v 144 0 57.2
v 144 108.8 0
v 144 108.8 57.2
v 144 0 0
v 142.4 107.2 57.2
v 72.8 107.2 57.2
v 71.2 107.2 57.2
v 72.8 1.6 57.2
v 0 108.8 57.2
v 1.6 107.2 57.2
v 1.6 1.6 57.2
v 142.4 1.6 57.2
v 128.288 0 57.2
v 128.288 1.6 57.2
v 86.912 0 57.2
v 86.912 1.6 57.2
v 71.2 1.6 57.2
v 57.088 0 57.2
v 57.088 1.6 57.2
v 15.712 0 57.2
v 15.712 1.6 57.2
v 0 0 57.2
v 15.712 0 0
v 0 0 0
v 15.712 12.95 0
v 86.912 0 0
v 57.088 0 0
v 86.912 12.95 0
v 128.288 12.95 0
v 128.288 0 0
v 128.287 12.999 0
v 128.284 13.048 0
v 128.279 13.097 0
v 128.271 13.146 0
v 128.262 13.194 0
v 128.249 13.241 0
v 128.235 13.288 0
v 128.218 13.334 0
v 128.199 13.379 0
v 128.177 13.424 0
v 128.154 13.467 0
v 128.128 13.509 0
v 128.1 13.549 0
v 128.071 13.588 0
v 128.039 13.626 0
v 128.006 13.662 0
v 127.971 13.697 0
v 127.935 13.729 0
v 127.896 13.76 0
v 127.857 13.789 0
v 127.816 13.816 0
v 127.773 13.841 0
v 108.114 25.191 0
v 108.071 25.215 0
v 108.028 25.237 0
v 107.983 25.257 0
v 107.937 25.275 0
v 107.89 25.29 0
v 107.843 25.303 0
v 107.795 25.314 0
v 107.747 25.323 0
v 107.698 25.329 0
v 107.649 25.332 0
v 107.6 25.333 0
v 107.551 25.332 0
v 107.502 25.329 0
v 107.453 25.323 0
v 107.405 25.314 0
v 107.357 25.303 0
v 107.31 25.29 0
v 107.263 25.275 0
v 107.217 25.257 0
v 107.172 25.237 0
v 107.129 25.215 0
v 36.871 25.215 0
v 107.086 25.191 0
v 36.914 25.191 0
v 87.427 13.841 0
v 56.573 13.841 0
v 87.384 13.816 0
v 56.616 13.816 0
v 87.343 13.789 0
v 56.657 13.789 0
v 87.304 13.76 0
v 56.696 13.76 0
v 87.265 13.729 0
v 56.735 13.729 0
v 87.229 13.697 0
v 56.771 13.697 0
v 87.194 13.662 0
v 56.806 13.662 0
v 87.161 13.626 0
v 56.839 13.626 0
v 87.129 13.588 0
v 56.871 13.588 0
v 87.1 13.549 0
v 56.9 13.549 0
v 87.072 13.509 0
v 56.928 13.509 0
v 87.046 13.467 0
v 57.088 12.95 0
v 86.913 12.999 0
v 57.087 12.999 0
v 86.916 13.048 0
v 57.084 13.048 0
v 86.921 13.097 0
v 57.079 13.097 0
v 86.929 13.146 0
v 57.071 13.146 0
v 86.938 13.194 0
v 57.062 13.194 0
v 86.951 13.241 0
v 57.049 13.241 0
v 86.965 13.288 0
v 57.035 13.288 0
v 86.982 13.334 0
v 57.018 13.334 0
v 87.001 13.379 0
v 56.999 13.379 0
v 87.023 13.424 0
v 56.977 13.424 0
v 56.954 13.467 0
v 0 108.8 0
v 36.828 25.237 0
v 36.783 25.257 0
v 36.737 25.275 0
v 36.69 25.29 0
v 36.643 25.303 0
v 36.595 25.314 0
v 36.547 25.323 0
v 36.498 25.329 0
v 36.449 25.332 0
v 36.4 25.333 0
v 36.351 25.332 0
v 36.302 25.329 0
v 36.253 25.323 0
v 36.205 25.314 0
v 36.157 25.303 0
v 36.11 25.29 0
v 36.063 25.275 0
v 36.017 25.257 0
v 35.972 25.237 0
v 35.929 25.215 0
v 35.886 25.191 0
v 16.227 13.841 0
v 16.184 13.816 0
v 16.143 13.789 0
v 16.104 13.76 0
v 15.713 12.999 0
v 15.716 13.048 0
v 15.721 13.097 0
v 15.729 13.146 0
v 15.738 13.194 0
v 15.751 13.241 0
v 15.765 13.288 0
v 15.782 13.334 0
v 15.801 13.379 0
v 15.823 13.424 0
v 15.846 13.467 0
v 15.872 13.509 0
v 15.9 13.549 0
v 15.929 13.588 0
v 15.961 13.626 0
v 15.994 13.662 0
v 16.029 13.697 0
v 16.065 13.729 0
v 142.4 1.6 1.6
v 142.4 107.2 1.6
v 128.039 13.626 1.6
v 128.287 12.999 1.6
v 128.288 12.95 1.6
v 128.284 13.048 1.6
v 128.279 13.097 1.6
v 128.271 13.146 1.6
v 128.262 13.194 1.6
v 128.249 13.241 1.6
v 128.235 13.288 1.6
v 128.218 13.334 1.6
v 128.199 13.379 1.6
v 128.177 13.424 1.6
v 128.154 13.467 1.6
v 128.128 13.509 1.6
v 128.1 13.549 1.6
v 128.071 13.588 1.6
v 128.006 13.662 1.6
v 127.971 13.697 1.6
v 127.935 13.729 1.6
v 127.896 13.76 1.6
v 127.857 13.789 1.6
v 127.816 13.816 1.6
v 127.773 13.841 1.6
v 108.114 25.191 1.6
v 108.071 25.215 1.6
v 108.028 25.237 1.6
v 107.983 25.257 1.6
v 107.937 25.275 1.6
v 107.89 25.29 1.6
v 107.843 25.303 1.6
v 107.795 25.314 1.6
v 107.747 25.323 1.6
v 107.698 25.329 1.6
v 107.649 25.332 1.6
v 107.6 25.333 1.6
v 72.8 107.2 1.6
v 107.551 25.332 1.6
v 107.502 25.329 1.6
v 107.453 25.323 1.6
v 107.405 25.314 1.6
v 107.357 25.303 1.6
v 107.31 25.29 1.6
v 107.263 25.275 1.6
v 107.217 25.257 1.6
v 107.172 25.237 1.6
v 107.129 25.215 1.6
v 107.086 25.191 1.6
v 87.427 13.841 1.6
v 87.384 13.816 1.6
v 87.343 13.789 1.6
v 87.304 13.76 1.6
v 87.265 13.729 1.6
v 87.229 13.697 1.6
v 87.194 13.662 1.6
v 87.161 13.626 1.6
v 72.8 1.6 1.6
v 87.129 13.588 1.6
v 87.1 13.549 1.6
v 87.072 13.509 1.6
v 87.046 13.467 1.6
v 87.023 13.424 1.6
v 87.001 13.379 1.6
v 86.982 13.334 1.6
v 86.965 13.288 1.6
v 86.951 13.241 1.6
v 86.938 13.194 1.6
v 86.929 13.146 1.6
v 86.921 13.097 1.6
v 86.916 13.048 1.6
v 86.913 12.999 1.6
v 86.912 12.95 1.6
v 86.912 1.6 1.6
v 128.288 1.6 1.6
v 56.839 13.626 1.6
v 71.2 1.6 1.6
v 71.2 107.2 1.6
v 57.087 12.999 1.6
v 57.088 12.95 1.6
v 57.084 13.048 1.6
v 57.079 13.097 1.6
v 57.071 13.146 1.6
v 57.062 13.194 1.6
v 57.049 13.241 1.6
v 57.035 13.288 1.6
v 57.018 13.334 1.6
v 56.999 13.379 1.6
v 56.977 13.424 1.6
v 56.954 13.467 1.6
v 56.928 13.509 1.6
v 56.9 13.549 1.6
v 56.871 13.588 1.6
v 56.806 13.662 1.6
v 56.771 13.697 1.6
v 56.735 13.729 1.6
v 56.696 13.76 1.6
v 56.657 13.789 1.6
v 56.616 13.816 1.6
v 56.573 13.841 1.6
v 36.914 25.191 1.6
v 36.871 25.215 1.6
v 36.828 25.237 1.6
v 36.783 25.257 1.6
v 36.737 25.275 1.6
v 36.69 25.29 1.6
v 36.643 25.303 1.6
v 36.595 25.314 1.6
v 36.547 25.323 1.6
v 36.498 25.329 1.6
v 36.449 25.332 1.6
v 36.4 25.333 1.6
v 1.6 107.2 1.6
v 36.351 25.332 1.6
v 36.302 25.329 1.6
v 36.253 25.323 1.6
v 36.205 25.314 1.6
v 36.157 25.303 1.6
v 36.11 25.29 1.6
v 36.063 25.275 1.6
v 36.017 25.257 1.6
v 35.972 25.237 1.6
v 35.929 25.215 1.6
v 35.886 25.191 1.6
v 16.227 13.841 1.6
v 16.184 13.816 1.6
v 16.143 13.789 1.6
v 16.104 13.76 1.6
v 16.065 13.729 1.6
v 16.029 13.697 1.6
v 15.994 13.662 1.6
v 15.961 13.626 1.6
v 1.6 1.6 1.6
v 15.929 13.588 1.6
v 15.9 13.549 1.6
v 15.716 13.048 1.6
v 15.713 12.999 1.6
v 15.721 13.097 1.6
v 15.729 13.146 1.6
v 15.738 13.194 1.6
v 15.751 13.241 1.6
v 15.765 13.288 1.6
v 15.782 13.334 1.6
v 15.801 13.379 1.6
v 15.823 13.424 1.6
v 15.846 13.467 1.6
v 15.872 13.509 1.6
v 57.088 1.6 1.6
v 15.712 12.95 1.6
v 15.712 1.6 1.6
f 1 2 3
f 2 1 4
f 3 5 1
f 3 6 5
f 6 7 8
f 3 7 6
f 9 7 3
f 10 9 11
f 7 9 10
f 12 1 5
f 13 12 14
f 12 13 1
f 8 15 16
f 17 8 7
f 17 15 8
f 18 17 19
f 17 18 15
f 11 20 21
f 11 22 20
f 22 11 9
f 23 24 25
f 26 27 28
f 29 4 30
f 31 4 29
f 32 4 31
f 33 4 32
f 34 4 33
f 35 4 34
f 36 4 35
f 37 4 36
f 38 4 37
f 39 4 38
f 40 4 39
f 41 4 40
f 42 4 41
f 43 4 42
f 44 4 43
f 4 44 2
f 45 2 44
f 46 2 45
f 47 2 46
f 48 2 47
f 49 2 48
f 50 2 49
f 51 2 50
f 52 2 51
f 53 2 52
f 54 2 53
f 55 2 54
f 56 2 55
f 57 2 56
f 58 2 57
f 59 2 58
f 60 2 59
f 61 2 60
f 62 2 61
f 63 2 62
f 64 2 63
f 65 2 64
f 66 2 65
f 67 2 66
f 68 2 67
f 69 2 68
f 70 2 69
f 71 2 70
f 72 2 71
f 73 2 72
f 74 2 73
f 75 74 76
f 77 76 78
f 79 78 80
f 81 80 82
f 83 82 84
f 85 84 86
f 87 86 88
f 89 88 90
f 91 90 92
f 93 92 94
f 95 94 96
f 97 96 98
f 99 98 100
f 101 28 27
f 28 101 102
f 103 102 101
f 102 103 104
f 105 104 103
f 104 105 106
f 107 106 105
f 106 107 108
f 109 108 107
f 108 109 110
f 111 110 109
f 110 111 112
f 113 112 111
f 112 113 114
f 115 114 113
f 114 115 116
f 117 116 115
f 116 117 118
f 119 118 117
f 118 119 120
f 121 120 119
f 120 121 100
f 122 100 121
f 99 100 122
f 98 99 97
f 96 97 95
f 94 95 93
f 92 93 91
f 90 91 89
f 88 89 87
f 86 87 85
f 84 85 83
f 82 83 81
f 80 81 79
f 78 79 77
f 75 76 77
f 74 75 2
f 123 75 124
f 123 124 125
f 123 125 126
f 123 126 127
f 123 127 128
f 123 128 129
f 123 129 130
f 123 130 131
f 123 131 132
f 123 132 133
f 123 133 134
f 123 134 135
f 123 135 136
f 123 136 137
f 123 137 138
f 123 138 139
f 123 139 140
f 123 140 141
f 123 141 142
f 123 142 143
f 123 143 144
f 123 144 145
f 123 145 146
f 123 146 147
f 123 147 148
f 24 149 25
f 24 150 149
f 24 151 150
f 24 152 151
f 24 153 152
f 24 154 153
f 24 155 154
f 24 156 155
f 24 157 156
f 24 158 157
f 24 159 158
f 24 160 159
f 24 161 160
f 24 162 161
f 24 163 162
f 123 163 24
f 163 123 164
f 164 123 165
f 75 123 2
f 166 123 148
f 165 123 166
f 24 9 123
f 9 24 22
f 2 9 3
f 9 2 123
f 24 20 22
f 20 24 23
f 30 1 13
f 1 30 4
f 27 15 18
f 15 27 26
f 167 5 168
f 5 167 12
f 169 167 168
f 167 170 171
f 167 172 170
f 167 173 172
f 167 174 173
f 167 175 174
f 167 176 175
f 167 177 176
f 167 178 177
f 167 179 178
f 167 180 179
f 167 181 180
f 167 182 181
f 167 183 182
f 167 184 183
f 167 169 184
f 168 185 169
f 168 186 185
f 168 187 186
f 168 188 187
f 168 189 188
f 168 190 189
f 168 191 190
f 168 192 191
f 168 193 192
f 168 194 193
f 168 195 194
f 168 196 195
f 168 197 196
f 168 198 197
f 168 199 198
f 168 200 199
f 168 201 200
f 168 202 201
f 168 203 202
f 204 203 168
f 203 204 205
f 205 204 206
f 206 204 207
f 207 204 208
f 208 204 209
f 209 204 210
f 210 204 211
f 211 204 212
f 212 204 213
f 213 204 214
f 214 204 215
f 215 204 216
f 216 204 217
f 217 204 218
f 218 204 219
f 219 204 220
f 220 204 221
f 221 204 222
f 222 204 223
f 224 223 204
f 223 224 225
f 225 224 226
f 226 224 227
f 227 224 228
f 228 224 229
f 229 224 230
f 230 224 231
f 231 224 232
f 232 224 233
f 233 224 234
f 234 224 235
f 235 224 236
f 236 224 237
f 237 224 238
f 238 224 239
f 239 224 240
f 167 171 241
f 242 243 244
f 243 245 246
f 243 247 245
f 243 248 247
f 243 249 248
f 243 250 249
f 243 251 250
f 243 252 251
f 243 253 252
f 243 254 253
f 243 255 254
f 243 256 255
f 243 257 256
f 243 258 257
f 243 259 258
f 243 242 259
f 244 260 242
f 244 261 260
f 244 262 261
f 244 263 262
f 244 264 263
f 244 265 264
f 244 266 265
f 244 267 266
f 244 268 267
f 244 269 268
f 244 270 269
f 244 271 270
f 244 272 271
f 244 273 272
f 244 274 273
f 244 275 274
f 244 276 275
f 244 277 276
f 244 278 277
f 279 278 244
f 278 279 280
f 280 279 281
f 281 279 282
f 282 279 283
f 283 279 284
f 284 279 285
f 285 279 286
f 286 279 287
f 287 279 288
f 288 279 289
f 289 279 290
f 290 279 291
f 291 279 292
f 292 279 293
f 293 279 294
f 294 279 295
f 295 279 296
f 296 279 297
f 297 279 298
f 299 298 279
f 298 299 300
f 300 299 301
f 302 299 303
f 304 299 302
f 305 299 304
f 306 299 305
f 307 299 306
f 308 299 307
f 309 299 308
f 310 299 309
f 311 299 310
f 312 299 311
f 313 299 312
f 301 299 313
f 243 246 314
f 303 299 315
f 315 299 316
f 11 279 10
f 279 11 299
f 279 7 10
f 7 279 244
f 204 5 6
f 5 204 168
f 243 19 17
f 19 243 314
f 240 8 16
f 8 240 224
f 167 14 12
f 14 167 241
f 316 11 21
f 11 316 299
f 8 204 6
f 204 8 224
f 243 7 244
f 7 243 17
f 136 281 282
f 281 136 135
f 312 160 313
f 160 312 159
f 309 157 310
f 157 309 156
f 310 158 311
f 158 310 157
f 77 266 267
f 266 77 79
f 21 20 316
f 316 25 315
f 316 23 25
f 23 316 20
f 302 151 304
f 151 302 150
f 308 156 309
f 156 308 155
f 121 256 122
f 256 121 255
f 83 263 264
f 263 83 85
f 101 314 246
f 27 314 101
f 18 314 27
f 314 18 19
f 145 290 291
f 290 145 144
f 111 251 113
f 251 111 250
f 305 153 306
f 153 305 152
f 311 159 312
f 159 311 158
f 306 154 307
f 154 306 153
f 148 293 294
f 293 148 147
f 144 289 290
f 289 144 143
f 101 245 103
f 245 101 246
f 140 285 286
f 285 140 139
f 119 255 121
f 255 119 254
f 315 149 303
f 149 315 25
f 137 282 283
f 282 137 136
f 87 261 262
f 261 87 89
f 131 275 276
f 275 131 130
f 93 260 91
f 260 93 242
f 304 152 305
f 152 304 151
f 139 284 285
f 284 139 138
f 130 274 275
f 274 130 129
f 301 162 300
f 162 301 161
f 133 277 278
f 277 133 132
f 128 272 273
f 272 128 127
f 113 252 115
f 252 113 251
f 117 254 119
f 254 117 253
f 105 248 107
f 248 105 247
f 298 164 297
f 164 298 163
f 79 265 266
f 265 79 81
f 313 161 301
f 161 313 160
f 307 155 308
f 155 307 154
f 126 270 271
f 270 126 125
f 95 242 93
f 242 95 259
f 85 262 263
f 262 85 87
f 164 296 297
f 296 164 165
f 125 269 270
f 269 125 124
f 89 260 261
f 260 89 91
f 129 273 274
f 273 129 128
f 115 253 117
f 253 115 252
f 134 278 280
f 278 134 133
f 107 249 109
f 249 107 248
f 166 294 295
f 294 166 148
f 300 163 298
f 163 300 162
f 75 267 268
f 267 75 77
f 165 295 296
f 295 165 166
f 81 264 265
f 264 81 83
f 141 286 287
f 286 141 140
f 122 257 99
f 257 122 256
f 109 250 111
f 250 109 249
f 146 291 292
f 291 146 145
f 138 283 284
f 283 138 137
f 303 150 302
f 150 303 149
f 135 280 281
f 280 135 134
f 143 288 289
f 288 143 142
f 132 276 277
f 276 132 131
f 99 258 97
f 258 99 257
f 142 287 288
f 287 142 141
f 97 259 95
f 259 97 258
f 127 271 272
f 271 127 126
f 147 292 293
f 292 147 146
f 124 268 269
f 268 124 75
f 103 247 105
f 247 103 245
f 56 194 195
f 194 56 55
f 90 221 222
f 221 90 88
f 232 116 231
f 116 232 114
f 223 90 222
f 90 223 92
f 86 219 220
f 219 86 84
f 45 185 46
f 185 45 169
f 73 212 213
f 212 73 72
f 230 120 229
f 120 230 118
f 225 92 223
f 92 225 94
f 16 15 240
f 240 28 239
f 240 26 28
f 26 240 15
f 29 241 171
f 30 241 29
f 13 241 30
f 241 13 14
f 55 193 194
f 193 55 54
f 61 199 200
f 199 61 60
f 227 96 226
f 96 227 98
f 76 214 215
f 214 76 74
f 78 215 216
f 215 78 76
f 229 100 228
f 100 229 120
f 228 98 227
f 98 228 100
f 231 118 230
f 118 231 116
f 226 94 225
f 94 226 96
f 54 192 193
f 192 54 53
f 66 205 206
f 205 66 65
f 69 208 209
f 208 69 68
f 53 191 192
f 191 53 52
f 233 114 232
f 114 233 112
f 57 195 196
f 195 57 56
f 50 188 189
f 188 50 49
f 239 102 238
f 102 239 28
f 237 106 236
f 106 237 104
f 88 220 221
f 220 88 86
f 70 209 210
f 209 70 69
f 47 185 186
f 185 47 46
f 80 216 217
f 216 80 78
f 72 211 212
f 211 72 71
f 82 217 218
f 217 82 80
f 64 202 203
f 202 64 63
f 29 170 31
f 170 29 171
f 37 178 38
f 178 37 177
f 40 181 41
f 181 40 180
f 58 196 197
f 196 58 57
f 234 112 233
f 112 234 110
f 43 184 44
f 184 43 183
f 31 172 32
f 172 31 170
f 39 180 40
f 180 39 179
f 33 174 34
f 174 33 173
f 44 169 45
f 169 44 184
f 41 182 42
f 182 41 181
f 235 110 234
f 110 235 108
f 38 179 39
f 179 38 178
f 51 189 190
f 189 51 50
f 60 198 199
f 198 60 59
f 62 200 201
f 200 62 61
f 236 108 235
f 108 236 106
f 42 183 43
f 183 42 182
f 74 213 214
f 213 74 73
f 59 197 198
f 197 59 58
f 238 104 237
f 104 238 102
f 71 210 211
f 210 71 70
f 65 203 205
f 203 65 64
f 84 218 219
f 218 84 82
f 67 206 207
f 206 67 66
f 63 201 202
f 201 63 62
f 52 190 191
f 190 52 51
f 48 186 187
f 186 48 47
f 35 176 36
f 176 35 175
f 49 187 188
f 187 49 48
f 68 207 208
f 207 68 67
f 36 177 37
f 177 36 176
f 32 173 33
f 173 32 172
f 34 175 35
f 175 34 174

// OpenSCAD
// file: ../../internal/tray.scad
// Copyright 2023 Joshua Star, All Rights Reserved

include <base.scad>

use <prim.scad>

module tray_basic(inner_size, r=0, thickness=DEFAULT_THICKNESS, bottom_thickness=undef) {

	half_z = inner_size.z / 2;
	radius = min(r, half_z);

	bottom_thk = bottom_thickness != undef ? bottom_thickness : thickness;

	thk2 = thickness * 2;

	outer_size = inner_size + [thk2, thk2, bottom_thk];
	echo("tray outer dimensions are: ", outer_size);

	inner_radius = radius - thickness;

	union() {
		difference() {
			// outer shell
			if (0 < r) {
				union() {
					translate([0, 0, bottom_thk])
						cylinder_cube([outer_size.x, outer_size.y, outer_size.z - bottom_thk], r=radius);
					cylinder_cube([outer_size.x, outer_size.y, bottom_thk], inner_radius, radius);
				}
			}
			else {
				cube(outer_size);
			}
			
			// lip cutout
			if (0 < radius) {
				translate([0, 0, inner_size.z + SMALL_NUM])
					cylinder_cube([outer_size.x, outer_size.y, bottom_thk], r1=inner_radius, r2=radius);
			}

			// inner cutout
			if (0 < radius) {
				translate([thickness, thickness, bottom_thk])
					rounded_cube(inner_size + [0, 0, bottom_thk], r=inner_radius, flat_top=true);
			}
			else {
				translate([thickness, thickness, bottom_thk])
						cube(inner_size + [0, 0, bottom_thk]);
			}
		}
	}
}

module tray_divided(size, r=0, div_x=1, div_y=1, thickness=DEFAULT_THICKNESS, bottom_thickness=undef, div_height=undef, div_thickness=undef) {

	bottom_thk = bottom_thickness != undef ? bottom_thickness : thickness;

	div_thk = div_thickness != undef ? div_thickness : thickness;
	div_z = div_height != undef ? div_height : size.z;

	max_div_z = 0 == r ? size.z : size.z - bottom_thk;
	clamped_div_z = min(div_z, max_div_z);

	x_minus_div = size.x - (div_thk * (div_x - 1));
	y_minus_div = size.y - (div_thk * (div_y - 1));

	x_off = (x_minus_div / div_x) + div_thk;
	y_off = (y_minus_div / div_y) + div_thk;
	
	union() {
		tray_basic(size, r=r, thickness=thickness, bottom_thickness=bottom_thk);

		// columns, along x
		for (i=[1:1:div_x-1]) {
			translate([i * x_off, thickness, bottom_thk])
				cube([div_thk, size.y, clamped_div_z]);
		}

		// rows, along y
		for (i=[1:1:div_y-1]) {
			translate([thickness, i * y_off, bottom_thk])
				cube([size.x, div_thk, clamped_div_z]);
		}
	}
}

module notch_cutter(h, r) {
	n = 6;
	rotate([0, 0, 180 / n]) cylinder_ngon(2 * r, h, n);
}

module tray_notched(size, div_x=1, div_y=1, thickness=DEFAULT_THICKNESS, bottom_thickness=undef, div_height=undef, div_thickness=undef, notch_lo_x=true, notch_hi_x=true) {

	bottom_thk = bottom_thickness != undef ? bottom_thickness : thickness;

	div_thk = div_thickness != undef ? div_thickness : thickness;
	div_z = div_height != undef ? div_height : size.z;

	x_minus_div = size.x - (div_thk * (div_x - 1));

	x_off = (x_minus_div / div_x) + div_thk;
	
	div_bias = (div_thk - x_off) / 2;

	notch_h = size.z + bottom_thk + 2 * SMALL_NUM;
	notch_r = x_off / 3;

	difference() {
		tray_divided(size, div_x=div_x, div_y=div_y, thickness=thickness, bottom_thickness=bottom_thk, div_height=div_z, div_thickness=div_thk);

		// notch along x
		for (i=[1:1:div_x]) {

			if (notch_lo_x) {
				translate([i * x_off + div_bias, thickness, -SMALL_NUM])
					notch_cutter(notch_h, notch_r);
			}

			if (notch_hi_x) {
				translate([i * x_off + div_bias, size.y + thickness, -SMALL_NUM])
					notch_cutter(notch_h, notch_r);
			}
		}
	}
}

// --- TESTING ---

//tray_basic([240, 120, 30], r=4);

//translate([-1.2, -1.2, 0]) tray_divided([200, 100, 5], div_x=20, div_y=10);
//tray_divided([180, 120, 30], r=15, div_x=3, div_y=2, div_height=25);

//translate([-1.2, -1.2, 0]) tray_notched([200, 100, 30], div_x=20, div_y=10);
// file: ../../internal/prim.scad
// Copyright 2023 Joshua Star, All Rights Reserved

module cylinder_cube(size, r1=1, r2=1, r=undef) {
	r1 = r != undef ? r : r1;
	r2 = r != undef ? r : r2;

	r_max = max(r1, r2);
	hull() {
		translate([r_max, r_max, 0])
			cylinder(size.z, r1, r2);
		translate([size.x - r_max, r_max, 0])
			cylinder(size.z, r1, r2);
		translate([r_max, size.y - r_max, 0])
			cylinder(size.z, r1, r2);
		translate([size.x - r_max, size.y - r_max, 0])
			cylinder(size.z, r1, r2);
	}
}

module cylinder_ngon(width, h, n=6, r=1) {
	hull() {
		for (i=[0:1:n-1]) {
			angl_off = 360 / n;
			posx_off = width / 2 - r;
			rotate([0, 0, i * angl_off]) translate([posx_off, 0, 0])
				cylinder(r=r, h=h);
		}
	}
}

module cylinder_trap(size, ratio, radius=1) {
	hull() {
		half_size_x = size.x / 2;
		translate([radius - half_size_x, radius, 0])
			cylinder(r=radius, h=size.z);
		translate([half_size_x - radius, radius, 0])
			cylinder(r=radius, h=size.z);
		translate([radius - ratio * half_size_x, size.y - radius, 0])
			cylinder(r=radius, h=size.z);
		translate([ratio * half_size_x - radius, size.y - radius, 0])
			cylinder(r=radius, h=size.z);
	}
}

module rounded_cube(size, r=1, flat_top=false) {
	
	half_z = size.z / 2;
	radius = min(r, half_z);
	
	hull() {
		// bottom 'points'
		translate([radius,radius,radius]) sphere(r=radius);
		translate([size.x-radius,radius,radius]) sphere(r=radius);
		translate([radius,size.y-radius,radius]) sphere(r=radius);
		translate([size.x-radius,size.y-radius,radius]) sphere(r=radius);

		// top 'points'
		pos_z = size.z - radius;
		if (flat_top) {
			translate([radius, radius, pos_z]) cylinder(r=radius, h=radius);
			translate([size.x-radius, radius, pos_z]) cylinder(r=radius, h=radius);
			translate([radius, size.y-radius, pos_z]) cylinder(r=radius, h=radius);
			translate([size.x-radius, size.y-radius, pos_z]) cylinder(r=radius, h=radius);
		}
		else {
			translate([radius, radius, pos_z]) sphere(r=radius);
			translate([size.x-radius, radius, pos_z]) sphere(r=radius);
			translate([radius, size.y-radius, pos_z]) sphere(r=radius);
			translate([size.x-radius, size.y-radius, pos_z]) sphere(r=radius);
		}
	}
}

// --- TESTING ---

//cylinder_cube([240, 120, 30], r=8);

//cylinder_cube([240, 120, 16], r1=4, r2=8);
//cylinder_cube([240, 120, 16], r1=8, r2=4);

//cylinder_ngon(10, 5, 7, 1);

//cylinder_trap([100, 50, 30], 0.5, radius=8);

//rounded_cube([240, 120, 30], r=12);
//rounded_cube([240, 120, 30], r=12, flat_top=true);
//rounded_cube([240, 120, 30], r=30, flat_top=true);
// file: ../../internal/math.scad
// Copyright 2023 Joshua Star, All Rights Reserved

function clamp(x, lower, upper) = x < lower ? lower : (upper < x ? upper : x);
function lerp(lower, upper, s) = (upper - lower) * s + lower;
// file: ../../internal/card.scad
// Copyright 2023 Joshua Star, All Rights Reserved

SMALL_TOLERANCE = [0.4, 0.4];
BIG_TOLERANCE = [1, 1];

function std_card_dim() = [67, 93] + SMALL_TOLERANCE; // gray
function amer_card_dim() = [59, 91] + SMALL_TOLERANCE; // green
function euro_card_dim() = [62, 94] + SMALL_TOLERANCE; // purple

function mini_amer_card_dim() = [44, 67] + SMALL_TOLERANCE; // yellow
function mini_euro_card_dim() = [46, 71] + SMALL_TOLERANCE; // ruby

function 7won_card_dim() = [67, 103] + BIG_TOLERANCE; // brown
function tarot_card_dim() = [73, 122] + BIG_TOLERANCE; // orange

function per_card_thickness() = 0.68;

function calc_card_stack(n, padding=1.2) = n * per_card_thickness() + padding;
// file: ../../internal/base.scad
// Copyright 2023 Joshua Star, All Rights Reserved

fn = $preview ? 16 : 128;
$fn = fn;

SMALL_NUM = $preview ? 0.02 : 0.001;

DEFAULT_PADDING = 1.6;
DEFAULT_THICKNESS = 1.2;
// file: ../../boardgame_tk.scad
// Copyright 2023 Joshua Star, All Rights Reserved

include <internal/base.scad>

include <internal/card.scad>
include <internal/math.scad>
include <internal/prim.scad>
include <internal/tray.scad>

DEFAULT_PADDING = 1.6;
DEFAULT_THICKNESS = 1.2;

function default_padding() = DEFAULT_PADDING;
function default_thickness() = DEFAULT_THICKNESS;

function gamebox_common() = [286, 286, 68]; // Terraforming Mars, Wingspan

function make_list(v, n) = [for(i=[0:n-1]) v];
function sum_list(v) = [for(p=v) 1] * v;

module card_display(card_size, height, num_stacks, padding=DEFAULT_PADDING, thickness=DEFAULT_THICKNESS, bottom_thickness=undef, div_thickness=undef) {

	div_thk = div_thickness != undef ? div_thickness : thickness;

	dim_x = (card_size.x + padding) * num_stacks + (div_thk * (num_stacks - 1));
	dim_y = card_size.y + padding;
	dim_z = height;

	tray_notched([dim_x, dim_y, dim_z], div_x=num_stacks, thickness=thickness, bottom_thickness=bottom_thickness, div_thickness=div_thickness, notch_hi_x=false);
}

module vertical_cutter(size, r=0.5) {
	difference() {
		translate([0, size.z, 0]) rotate([90, 0, 0])
		linear_extrude(height=size.z) {
			translate([0, r, 0])
			offset(r=-r) {
				offset(r=2*r) {
					union() {
						translate([-(size.x + 2 * r) / 2, 0, 0]) square([size.x + 2 * r, 1]);
						translate([-(size.x - 2 * r)/2, -size.y, 0]) square([size.x - 2 * r, size.y]);
					}
				}
			}
		}

		translate([-(size.x + r), -size.z, 0])
			cube([2 * (size.x + r), 3 * size.z, 2 * (size.y + r)]);
	}
}

module card_tray(card_size, stacks, num_columns=1, padding=[0.8, 0.8, 0.8], thickness=DEFAULT_THICKNESS, bottom_thickness=undef, div_height=undef, div_thickness=undef) {

	bottom_thk = bottom_thickness != undef ? bottom_thickness : thickness;

	div_thk = div_thickness != undef ? div_thickness : thickness;

	col_dim_x = card_size.y + padding.x;

	dim_x = col_dim_x * num_columns + div_thk * (num_columns - 1);
	dim_y = sum_list(stacks) + (div_thk + padding.y) * (len(stacks) - 1);
	dim_z = card_size.x + padding.z;

	div_z = div_height != undef ? div_height : dim_z;

	min_card_dim = min(card_size.x, card_size.y);
	cutter_radius = min_card_dim / 6;

	difference() {
		union() {
			tray_divided([dim_x, dim_y, dim_z], div_x=num_columns, thickness=thickness, bottom_thickness=bottom_thickness);

			div_offsets = [
				for (a=0, b=stacks[0]; a < (len(stacks) - 1); a = a + 1, b = b + (stacks[a]==undef?0:stacks[a]) + padding.y + div_thk)
					b
				];

			// columns, along x
			for (c=[0:1:num_columns-1]) {
				// rows, along y
				for (y=div_offsets) {
					x_off = c * (col_dim_x + div_thk) + thickness;

					translate([x_off, y, bottom_thk])
						cube([col_dim_x, div_thk, div_z]);
				}
			}
		}

		cutout_size = [col_dim_x / 2, dim_z / 2, thickness + 2 * SMALL_NUM];
		cutout_z = bottom_thk + dim_z + SMALL_NUM;

		// cutout
		for (c=[0:1:num_columns-1]) {
			n = 8;

			x_off = c * (col_dim_x + div_thk) + (col_dim_x / 2) + thickness;

			// front cut
			translate([x_off, -SMALL_NUM, cutout_z])
					vertical_cutter(cutout_size, r=cutter_radius);
			
			// back cut
			translate([x_off, dim_y + thickness - SMALL_NUM, cutout_z])
					vertical_cutter(cutout_size, r=cutter_radius);
			
			// middle cut
			translate([x_off, thickness, bottom_thk + div_z + SMALL_NUM])
					vertical_cutter([cutout_size.x, div_z / 2, dim_y], r=cutter_radius);
		}
	}
}

module spacer(size, r=16, div_x=2, div_y=2, spacing=16) {
	difference() {
		cylinder_cube(size, r=r);

		half_spacing = spacing / 2;
		inner_radius = r - half_spacing;

		offset_x = size.x / div_x;
		offset_y = size.y / div_y;
		for (i=[0:1:div_x]) {
			for (j=[0:1:div_y]) {
				translate([i * offset_x + half_spacing, j * offset_y + half_spacing, -1])
				cylinder_cube([
					size.x / div_x - spacing,
					size.y / div_y - spacing,
					size.z + 2], r=inner_radius);
			}
		}
	}
}

module pegs_grid(rows=1, cols=1, radius=1, height=1, spacing=1, alt_pack=false) {
	x_start = spacing + radius;
	y_start = spacing + radius;

	x_alt_start = radius + spacing / 2;

	x_offset = 2 * radius + spacing;
	y_offset = alt_pack ? ((radius + spacing / 2) * sqrt(3)) : 2 * radius + spacing;

	for (r=[0:1:rows-1]) {
		is_alt = alt_pack ? (r % 2) : 0;
		for (c=[0:1:cols-(1 + is_alt)]) {
			translate([
					c * x_offset + x_start + x_alt_start * is_alt,
					r * y_offset + y_start,
					0])
				cylinder(h=height, r=radius);
		}
	}
}

module peg_board(rows=1, cols=1, radius=1, height=1, spacing=1) {
	difference() {
		cylinder_cube([
			cols * 2 * radius + (cols + 1) * spacing,
			rows * 2 * radius + (rows + 1) * spacing,
			height], r=radius);

		translate([0, 0, -height/2])
			pegs_grid(rows=rows, cols=cols, radius=radius, height=2*height, spacing=spacing, alt_pack=false);
	}
}

// --- TESTING ---

//%cube(gamebox_common());

//card_display(mini_euro_card_dim(), 30, 3);

//vertical_cutter([100,50, 10], r=10);

//card_tray(std_card_dim(), [30, 30, 8, 8, 8, 16, 42], num_columns=4, div_height=55);

//spacer([240, 120, 10], r=16, div_x=4, div_y=3, spacing=8);

//pegs_grid(rows=4, cols=5, radius=32, height=4, spacing=6, alt_pack=false);
//pegs_grid(rows=4, cols=5, radius=32, height=4, spacing=6, alt_pack=true);

//peg_board(rows=3, cols=4, radius=28, height=4, spacing=6);
// main file
// Copyright 2023 Joshua Star, All Rights Reserved

use <../../boardgame_tk.scad>

slots = 2;
depth = calc_card_stack(80);

card_display(7won_card_dim(), depth, slots, thickness=1.6);
